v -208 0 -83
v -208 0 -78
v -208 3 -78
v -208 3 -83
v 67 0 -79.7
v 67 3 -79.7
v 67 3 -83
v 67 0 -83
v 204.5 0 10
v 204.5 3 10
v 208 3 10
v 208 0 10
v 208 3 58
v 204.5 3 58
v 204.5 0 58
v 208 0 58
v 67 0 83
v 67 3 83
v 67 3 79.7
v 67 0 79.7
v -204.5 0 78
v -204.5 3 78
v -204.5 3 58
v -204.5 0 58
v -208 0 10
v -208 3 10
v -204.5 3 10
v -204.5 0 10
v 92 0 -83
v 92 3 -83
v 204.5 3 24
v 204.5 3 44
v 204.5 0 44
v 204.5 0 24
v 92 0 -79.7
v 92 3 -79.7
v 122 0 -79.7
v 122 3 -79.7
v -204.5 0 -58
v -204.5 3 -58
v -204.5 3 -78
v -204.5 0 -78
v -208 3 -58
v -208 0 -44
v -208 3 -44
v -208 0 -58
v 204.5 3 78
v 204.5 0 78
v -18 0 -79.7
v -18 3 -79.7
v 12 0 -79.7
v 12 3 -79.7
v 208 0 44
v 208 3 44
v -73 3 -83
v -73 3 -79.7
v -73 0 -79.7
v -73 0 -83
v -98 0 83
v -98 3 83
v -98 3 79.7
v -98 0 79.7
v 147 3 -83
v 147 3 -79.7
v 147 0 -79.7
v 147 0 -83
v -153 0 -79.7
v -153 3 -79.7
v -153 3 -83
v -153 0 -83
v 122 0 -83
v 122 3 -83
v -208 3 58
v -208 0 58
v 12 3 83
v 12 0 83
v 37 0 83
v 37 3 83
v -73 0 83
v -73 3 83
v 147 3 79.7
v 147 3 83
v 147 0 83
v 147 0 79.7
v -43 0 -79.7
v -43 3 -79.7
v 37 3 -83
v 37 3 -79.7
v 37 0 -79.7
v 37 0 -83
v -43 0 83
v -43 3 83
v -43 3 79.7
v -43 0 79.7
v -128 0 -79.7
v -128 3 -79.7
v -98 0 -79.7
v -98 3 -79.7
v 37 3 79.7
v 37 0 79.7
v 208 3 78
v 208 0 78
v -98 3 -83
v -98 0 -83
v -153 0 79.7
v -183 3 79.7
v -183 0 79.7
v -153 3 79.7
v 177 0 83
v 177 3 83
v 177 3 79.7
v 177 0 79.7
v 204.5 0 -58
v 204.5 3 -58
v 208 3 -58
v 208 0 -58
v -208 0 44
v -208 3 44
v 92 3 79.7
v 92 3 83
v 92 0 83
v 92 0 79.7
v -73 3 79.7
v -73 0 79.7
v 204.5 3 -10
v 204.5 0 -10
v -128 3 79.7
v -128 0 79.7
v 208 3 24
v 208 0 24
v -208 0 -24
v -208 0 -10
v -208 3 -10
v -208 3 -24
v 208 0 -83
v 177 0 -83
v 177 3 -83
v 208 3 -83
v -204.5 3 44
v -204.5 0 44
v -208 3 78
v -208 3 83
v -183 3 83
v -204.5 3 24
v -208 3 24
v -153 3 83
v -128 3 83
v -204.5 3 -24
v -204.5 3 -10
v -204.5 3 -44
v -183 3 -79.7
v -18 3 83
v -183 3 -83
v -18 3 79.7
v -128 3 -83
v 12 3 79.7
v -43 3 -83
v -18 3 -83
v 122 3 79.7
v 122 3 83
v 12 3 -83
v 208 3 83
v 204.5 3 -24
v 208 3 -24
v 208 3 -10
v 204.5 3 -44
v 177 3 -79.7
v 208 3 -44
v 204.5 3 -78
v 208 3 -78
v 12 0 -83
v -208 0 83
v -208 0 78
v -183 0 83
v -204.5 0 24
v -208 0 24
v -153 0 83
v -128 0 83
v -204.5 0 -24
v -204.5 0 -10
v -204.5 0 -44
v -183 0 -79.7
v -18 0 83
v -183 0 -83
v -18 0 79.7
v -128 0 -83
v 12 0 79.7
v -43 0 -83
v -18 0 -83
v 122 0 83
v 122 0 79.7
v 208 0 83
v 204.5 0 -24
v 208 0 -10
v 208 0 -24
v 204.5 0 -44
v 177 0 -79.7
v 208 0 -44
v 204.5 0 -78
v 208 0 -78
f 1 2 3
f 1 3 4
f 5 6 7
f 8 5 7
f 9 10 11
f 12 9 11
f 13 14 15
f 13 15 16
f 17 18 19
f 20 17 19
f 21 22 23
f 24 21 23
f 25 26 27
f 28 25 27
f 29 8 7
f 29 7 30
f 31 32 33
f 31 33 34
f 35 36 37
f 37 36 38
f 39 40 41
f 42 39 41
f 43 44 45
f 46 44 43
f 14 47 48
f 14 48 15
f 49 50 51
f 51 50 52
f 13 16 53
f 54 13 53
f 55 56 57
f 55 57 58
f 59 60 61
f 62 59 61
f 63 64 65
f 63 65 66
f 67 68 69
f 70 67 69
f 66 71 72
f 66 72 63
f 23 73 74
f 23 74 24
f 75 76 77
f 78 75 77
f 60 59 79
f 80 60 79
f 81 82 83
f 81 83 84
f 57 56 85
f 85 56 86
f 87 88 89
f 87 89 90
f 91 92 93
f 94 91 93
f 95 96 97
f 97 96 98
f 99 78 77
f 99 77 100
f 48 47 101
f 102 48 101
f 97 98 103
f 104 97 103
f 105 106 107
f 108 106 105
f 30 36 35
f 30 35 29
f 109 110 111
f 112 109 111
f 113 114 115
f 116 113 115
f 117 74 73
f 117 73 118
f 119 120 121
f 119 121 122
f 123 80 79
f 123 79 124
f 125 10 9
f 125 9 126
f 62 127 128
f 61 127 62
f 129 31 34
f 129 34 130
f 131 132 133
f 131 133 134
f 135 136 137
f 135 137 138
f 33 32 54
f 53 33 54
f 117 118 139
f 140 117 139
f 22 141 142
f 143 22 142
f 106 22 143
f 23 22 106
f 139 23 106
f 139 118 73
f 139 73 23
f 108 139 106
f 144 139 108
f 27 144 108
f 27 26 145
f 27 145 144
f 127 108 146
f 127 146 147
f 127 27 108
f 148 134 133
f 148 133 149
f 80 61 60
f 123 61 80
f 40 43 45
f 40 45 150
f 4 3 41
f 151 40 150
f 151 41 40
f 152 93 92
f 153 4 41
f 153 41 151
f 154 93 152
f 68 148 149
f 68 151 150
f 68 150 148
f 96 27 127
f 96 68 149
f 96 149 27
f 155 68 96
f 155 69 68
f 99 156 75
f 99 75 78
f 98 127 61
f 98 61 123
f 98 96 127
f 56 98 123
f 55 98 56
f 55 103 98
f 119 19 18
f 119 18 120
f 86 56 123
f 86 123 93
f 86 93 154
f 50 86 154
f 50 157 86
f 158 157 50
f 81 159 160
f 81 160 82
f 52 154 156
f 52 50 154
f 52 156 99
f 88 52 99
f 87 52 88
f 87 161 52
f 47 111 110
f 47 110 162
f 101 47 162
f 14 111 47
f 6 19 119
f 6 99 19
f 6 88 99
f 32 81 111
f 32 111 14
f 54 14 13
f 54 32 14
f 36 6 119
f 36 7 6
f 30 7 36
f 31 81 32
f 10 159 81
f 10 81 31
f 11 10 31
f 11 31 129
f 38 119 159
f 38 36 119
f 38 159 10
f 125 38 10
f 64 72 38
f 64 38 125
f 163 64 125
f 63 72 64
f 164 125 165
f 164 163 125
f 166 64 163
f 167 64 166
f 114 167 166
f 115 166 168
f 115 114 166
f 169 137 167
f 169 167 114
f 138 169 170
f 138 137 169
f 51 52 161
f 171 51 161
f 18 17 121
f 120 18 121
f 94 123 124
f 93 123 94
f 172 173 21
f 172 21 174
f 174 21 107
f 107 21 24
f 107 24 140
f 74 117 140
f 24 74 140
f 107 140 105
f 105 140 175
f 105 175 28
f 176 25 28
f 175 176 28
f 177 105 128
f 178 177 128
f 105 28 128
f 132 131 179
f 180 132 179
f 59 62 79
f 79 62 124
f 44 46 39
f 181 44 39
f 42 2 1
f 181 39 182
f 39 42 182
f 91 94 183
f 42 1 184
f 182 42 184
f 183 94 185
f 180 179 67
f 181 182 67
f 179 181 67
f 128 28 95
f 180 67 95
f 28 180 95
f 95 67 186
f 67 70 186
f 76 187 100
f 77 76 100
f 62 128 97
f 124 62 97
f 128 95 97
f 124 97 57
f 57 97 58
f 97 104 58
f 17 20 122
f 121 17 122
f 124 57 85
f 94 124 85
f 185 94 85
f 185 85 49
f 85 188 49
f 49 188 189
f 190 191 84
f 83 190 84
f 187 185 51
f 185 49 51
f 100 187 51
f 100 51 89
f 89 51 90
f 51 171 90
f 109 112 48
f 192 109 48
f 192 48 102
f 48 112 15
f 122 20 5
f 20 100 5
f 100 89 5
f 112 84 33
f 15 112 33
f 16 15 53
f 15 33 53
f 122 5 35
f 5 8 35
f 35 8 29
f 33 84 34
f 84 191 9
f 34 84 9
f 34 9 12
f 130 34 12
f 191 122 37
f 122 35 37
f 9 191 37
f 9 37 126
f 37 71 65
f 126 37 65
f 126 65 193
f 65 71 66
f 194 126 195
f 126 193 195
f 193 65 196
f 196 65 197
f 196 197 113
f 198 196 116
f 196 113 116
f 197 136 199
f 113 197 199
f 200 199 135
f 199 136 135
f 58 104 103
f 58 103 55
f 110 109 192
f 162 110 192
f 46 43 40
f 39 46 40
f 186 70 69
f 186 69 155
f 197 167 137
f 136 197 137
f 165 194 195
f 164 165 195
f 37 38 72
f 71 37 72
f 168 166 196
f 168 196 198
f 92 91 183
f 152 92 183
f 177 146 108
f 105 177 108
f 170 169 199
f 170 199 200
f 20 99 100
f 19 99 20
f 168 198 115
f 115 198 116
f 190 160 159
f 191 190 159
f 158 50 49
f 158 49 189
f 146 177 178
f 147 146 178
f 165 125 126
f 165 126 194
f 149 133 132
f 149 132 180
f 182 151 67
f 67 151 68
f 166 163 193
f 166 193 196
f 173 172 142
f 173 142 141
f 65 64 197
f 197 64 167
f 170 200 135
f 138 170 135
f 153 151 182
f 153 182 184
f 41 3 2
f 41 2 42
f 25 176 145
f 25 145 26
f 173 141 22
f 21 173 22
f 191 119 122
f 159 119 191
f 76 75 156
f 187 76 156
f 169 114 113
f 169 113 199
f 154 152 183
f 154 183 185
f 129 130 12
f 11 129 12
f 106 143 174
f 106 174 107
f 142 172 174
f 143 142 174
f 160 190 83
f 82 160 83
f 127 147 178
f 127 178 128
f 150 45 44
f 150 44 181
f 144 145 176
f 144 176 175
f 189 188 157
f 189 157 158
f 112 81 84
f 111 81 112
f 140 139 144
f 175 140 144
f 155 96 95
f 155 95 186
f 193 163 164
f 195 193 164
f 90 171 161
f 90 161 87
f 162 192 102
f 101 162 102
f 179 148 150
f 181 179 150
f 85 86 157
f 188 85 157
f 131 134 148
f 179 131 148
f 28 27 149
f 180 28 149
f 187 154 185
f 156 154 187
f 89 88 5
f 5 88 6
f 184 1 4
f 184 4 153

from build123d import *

# Parameters (mm, degrees)
SKETCH1_W           = 416
SKETCH1_H           = 166
BOSS_EXTRUDE1_DEPTH = 3
SKETCH2_W           = 30
SKETCH2_H           = 3.3
SKETCH2_W_2         = 3.5
SKETCH2_H_2         = 20
CUT_EXTRUDE1_DEPTH  = 3


with BuildPart() as part:
    # Sketch1 → Boss-Extrude1 (new body)
    with BuildSketch(Plane(origin=(0, 0, 0), x_dir=(1, 0, 0), z_dir=(0, 1, 0))):
        Rectangle(SKETCH1_W, SKETCH1_H)
    extrude(amount=BOSS_EXTRUDE1_DEPTH)

    # Sketch2 → Cut-Extrude1 (cut)
    with BuildSketch(Plane(origin=(0, 3, 0), x_dir=(1, 0, 0), z_dir=(0, 1, 0))):
        with Locations((-168, 81.35)):
            Rectangle(SKETCH2_W, SKETCH2_H)
        with Locations((-113, 81.35)):
            Rectangle(SKETCH2_W, SKETCH2_H)
        with Locations((-58, 81.35)):
            Rectangle(SKETCH2_W, SKETCH2_H)
        with Locations((-3, 81.35)):
            Rectangle(SKETCH2_W, SKETCH2_H)
        with Locations((52, 81.35)):
            Rectangle(SKETCH2_W, SKETCH2_H)
        with Locations((107, 81.35)):
            Rectangle(SKETCH2_W, SKETCH2_H)
        with Locations((162, 81.35)):
            Rectangle(SKETCH2_W, SKETCH2_H)
        with Locations((162, -81.35)):
            Rectangle(SKETCH2_W, SKETCH2_H)
        with Locations((107, -81.35)):
            Rectangle(SKETCH2_W, SKETCH2_H)
        with Locations((52, -81.35)):
            Rectangle(SKETCH2_W, SKETCH2_H)
        with Locations((-3, -81.35)):
            Rectangle(SKETCH2_W, SKETCH2_H)
        with Locations((-58, -81.35)):
            Rectangle(SKETCH2_W, SKETCH2_H)
        with Locations((-113, -81.35)):
            Rectangle(SKETCH2_W, SKETCH2_H)
        with Locations((-168, -81.35)):
            Rectangle(SKETCH2_W, SKETCH2_H)
        with Locations((-206.25, -34)):
            Rectangle(SKETCH2_W_2, SKETCH2_H_2)
        with Locations((-206.25, 0)):
            Rectangle(SKETCH2_W_2, SKETCH2_H_2)
        with Locations((-206.25, -68)):
            Rectangle(SKETCH2_W_2, SKETCH2_H_2)
        with Locations((-206.25, 34)):
            Rectangle(SKETCH2_W_2, SKETCH2_H_2)
        with Locations((-206.25, 68)):
            Rectangle(SKETCH2_W_2, SKETCH2_H_2)
        with Locations((206.25, -68)):
            Rectangle(SKETCH2_W_2, SKETCH2_H_2)
        with Locations((206.25, -34)):
            Rectangle(SKETCH2_W_2, SKETCH2_H_2)
        with Locations((206.25, 0)):
            Rectangle(SKETCH2_W_2, SKETCH2_H_2)
        with Locations((206.25, 34)):
            Rectangle(SKETCH2_W_2, SKETCH2_H_2)
        with Locations((206.25, 68)):
            Rectangle(SKETCH2_W_2, SKETCH2_H_2)
    extrude(amount=-CUT_EXTRUDE1_DEPTH, mode=Mode.SUBTRACT)


solid = part.part
